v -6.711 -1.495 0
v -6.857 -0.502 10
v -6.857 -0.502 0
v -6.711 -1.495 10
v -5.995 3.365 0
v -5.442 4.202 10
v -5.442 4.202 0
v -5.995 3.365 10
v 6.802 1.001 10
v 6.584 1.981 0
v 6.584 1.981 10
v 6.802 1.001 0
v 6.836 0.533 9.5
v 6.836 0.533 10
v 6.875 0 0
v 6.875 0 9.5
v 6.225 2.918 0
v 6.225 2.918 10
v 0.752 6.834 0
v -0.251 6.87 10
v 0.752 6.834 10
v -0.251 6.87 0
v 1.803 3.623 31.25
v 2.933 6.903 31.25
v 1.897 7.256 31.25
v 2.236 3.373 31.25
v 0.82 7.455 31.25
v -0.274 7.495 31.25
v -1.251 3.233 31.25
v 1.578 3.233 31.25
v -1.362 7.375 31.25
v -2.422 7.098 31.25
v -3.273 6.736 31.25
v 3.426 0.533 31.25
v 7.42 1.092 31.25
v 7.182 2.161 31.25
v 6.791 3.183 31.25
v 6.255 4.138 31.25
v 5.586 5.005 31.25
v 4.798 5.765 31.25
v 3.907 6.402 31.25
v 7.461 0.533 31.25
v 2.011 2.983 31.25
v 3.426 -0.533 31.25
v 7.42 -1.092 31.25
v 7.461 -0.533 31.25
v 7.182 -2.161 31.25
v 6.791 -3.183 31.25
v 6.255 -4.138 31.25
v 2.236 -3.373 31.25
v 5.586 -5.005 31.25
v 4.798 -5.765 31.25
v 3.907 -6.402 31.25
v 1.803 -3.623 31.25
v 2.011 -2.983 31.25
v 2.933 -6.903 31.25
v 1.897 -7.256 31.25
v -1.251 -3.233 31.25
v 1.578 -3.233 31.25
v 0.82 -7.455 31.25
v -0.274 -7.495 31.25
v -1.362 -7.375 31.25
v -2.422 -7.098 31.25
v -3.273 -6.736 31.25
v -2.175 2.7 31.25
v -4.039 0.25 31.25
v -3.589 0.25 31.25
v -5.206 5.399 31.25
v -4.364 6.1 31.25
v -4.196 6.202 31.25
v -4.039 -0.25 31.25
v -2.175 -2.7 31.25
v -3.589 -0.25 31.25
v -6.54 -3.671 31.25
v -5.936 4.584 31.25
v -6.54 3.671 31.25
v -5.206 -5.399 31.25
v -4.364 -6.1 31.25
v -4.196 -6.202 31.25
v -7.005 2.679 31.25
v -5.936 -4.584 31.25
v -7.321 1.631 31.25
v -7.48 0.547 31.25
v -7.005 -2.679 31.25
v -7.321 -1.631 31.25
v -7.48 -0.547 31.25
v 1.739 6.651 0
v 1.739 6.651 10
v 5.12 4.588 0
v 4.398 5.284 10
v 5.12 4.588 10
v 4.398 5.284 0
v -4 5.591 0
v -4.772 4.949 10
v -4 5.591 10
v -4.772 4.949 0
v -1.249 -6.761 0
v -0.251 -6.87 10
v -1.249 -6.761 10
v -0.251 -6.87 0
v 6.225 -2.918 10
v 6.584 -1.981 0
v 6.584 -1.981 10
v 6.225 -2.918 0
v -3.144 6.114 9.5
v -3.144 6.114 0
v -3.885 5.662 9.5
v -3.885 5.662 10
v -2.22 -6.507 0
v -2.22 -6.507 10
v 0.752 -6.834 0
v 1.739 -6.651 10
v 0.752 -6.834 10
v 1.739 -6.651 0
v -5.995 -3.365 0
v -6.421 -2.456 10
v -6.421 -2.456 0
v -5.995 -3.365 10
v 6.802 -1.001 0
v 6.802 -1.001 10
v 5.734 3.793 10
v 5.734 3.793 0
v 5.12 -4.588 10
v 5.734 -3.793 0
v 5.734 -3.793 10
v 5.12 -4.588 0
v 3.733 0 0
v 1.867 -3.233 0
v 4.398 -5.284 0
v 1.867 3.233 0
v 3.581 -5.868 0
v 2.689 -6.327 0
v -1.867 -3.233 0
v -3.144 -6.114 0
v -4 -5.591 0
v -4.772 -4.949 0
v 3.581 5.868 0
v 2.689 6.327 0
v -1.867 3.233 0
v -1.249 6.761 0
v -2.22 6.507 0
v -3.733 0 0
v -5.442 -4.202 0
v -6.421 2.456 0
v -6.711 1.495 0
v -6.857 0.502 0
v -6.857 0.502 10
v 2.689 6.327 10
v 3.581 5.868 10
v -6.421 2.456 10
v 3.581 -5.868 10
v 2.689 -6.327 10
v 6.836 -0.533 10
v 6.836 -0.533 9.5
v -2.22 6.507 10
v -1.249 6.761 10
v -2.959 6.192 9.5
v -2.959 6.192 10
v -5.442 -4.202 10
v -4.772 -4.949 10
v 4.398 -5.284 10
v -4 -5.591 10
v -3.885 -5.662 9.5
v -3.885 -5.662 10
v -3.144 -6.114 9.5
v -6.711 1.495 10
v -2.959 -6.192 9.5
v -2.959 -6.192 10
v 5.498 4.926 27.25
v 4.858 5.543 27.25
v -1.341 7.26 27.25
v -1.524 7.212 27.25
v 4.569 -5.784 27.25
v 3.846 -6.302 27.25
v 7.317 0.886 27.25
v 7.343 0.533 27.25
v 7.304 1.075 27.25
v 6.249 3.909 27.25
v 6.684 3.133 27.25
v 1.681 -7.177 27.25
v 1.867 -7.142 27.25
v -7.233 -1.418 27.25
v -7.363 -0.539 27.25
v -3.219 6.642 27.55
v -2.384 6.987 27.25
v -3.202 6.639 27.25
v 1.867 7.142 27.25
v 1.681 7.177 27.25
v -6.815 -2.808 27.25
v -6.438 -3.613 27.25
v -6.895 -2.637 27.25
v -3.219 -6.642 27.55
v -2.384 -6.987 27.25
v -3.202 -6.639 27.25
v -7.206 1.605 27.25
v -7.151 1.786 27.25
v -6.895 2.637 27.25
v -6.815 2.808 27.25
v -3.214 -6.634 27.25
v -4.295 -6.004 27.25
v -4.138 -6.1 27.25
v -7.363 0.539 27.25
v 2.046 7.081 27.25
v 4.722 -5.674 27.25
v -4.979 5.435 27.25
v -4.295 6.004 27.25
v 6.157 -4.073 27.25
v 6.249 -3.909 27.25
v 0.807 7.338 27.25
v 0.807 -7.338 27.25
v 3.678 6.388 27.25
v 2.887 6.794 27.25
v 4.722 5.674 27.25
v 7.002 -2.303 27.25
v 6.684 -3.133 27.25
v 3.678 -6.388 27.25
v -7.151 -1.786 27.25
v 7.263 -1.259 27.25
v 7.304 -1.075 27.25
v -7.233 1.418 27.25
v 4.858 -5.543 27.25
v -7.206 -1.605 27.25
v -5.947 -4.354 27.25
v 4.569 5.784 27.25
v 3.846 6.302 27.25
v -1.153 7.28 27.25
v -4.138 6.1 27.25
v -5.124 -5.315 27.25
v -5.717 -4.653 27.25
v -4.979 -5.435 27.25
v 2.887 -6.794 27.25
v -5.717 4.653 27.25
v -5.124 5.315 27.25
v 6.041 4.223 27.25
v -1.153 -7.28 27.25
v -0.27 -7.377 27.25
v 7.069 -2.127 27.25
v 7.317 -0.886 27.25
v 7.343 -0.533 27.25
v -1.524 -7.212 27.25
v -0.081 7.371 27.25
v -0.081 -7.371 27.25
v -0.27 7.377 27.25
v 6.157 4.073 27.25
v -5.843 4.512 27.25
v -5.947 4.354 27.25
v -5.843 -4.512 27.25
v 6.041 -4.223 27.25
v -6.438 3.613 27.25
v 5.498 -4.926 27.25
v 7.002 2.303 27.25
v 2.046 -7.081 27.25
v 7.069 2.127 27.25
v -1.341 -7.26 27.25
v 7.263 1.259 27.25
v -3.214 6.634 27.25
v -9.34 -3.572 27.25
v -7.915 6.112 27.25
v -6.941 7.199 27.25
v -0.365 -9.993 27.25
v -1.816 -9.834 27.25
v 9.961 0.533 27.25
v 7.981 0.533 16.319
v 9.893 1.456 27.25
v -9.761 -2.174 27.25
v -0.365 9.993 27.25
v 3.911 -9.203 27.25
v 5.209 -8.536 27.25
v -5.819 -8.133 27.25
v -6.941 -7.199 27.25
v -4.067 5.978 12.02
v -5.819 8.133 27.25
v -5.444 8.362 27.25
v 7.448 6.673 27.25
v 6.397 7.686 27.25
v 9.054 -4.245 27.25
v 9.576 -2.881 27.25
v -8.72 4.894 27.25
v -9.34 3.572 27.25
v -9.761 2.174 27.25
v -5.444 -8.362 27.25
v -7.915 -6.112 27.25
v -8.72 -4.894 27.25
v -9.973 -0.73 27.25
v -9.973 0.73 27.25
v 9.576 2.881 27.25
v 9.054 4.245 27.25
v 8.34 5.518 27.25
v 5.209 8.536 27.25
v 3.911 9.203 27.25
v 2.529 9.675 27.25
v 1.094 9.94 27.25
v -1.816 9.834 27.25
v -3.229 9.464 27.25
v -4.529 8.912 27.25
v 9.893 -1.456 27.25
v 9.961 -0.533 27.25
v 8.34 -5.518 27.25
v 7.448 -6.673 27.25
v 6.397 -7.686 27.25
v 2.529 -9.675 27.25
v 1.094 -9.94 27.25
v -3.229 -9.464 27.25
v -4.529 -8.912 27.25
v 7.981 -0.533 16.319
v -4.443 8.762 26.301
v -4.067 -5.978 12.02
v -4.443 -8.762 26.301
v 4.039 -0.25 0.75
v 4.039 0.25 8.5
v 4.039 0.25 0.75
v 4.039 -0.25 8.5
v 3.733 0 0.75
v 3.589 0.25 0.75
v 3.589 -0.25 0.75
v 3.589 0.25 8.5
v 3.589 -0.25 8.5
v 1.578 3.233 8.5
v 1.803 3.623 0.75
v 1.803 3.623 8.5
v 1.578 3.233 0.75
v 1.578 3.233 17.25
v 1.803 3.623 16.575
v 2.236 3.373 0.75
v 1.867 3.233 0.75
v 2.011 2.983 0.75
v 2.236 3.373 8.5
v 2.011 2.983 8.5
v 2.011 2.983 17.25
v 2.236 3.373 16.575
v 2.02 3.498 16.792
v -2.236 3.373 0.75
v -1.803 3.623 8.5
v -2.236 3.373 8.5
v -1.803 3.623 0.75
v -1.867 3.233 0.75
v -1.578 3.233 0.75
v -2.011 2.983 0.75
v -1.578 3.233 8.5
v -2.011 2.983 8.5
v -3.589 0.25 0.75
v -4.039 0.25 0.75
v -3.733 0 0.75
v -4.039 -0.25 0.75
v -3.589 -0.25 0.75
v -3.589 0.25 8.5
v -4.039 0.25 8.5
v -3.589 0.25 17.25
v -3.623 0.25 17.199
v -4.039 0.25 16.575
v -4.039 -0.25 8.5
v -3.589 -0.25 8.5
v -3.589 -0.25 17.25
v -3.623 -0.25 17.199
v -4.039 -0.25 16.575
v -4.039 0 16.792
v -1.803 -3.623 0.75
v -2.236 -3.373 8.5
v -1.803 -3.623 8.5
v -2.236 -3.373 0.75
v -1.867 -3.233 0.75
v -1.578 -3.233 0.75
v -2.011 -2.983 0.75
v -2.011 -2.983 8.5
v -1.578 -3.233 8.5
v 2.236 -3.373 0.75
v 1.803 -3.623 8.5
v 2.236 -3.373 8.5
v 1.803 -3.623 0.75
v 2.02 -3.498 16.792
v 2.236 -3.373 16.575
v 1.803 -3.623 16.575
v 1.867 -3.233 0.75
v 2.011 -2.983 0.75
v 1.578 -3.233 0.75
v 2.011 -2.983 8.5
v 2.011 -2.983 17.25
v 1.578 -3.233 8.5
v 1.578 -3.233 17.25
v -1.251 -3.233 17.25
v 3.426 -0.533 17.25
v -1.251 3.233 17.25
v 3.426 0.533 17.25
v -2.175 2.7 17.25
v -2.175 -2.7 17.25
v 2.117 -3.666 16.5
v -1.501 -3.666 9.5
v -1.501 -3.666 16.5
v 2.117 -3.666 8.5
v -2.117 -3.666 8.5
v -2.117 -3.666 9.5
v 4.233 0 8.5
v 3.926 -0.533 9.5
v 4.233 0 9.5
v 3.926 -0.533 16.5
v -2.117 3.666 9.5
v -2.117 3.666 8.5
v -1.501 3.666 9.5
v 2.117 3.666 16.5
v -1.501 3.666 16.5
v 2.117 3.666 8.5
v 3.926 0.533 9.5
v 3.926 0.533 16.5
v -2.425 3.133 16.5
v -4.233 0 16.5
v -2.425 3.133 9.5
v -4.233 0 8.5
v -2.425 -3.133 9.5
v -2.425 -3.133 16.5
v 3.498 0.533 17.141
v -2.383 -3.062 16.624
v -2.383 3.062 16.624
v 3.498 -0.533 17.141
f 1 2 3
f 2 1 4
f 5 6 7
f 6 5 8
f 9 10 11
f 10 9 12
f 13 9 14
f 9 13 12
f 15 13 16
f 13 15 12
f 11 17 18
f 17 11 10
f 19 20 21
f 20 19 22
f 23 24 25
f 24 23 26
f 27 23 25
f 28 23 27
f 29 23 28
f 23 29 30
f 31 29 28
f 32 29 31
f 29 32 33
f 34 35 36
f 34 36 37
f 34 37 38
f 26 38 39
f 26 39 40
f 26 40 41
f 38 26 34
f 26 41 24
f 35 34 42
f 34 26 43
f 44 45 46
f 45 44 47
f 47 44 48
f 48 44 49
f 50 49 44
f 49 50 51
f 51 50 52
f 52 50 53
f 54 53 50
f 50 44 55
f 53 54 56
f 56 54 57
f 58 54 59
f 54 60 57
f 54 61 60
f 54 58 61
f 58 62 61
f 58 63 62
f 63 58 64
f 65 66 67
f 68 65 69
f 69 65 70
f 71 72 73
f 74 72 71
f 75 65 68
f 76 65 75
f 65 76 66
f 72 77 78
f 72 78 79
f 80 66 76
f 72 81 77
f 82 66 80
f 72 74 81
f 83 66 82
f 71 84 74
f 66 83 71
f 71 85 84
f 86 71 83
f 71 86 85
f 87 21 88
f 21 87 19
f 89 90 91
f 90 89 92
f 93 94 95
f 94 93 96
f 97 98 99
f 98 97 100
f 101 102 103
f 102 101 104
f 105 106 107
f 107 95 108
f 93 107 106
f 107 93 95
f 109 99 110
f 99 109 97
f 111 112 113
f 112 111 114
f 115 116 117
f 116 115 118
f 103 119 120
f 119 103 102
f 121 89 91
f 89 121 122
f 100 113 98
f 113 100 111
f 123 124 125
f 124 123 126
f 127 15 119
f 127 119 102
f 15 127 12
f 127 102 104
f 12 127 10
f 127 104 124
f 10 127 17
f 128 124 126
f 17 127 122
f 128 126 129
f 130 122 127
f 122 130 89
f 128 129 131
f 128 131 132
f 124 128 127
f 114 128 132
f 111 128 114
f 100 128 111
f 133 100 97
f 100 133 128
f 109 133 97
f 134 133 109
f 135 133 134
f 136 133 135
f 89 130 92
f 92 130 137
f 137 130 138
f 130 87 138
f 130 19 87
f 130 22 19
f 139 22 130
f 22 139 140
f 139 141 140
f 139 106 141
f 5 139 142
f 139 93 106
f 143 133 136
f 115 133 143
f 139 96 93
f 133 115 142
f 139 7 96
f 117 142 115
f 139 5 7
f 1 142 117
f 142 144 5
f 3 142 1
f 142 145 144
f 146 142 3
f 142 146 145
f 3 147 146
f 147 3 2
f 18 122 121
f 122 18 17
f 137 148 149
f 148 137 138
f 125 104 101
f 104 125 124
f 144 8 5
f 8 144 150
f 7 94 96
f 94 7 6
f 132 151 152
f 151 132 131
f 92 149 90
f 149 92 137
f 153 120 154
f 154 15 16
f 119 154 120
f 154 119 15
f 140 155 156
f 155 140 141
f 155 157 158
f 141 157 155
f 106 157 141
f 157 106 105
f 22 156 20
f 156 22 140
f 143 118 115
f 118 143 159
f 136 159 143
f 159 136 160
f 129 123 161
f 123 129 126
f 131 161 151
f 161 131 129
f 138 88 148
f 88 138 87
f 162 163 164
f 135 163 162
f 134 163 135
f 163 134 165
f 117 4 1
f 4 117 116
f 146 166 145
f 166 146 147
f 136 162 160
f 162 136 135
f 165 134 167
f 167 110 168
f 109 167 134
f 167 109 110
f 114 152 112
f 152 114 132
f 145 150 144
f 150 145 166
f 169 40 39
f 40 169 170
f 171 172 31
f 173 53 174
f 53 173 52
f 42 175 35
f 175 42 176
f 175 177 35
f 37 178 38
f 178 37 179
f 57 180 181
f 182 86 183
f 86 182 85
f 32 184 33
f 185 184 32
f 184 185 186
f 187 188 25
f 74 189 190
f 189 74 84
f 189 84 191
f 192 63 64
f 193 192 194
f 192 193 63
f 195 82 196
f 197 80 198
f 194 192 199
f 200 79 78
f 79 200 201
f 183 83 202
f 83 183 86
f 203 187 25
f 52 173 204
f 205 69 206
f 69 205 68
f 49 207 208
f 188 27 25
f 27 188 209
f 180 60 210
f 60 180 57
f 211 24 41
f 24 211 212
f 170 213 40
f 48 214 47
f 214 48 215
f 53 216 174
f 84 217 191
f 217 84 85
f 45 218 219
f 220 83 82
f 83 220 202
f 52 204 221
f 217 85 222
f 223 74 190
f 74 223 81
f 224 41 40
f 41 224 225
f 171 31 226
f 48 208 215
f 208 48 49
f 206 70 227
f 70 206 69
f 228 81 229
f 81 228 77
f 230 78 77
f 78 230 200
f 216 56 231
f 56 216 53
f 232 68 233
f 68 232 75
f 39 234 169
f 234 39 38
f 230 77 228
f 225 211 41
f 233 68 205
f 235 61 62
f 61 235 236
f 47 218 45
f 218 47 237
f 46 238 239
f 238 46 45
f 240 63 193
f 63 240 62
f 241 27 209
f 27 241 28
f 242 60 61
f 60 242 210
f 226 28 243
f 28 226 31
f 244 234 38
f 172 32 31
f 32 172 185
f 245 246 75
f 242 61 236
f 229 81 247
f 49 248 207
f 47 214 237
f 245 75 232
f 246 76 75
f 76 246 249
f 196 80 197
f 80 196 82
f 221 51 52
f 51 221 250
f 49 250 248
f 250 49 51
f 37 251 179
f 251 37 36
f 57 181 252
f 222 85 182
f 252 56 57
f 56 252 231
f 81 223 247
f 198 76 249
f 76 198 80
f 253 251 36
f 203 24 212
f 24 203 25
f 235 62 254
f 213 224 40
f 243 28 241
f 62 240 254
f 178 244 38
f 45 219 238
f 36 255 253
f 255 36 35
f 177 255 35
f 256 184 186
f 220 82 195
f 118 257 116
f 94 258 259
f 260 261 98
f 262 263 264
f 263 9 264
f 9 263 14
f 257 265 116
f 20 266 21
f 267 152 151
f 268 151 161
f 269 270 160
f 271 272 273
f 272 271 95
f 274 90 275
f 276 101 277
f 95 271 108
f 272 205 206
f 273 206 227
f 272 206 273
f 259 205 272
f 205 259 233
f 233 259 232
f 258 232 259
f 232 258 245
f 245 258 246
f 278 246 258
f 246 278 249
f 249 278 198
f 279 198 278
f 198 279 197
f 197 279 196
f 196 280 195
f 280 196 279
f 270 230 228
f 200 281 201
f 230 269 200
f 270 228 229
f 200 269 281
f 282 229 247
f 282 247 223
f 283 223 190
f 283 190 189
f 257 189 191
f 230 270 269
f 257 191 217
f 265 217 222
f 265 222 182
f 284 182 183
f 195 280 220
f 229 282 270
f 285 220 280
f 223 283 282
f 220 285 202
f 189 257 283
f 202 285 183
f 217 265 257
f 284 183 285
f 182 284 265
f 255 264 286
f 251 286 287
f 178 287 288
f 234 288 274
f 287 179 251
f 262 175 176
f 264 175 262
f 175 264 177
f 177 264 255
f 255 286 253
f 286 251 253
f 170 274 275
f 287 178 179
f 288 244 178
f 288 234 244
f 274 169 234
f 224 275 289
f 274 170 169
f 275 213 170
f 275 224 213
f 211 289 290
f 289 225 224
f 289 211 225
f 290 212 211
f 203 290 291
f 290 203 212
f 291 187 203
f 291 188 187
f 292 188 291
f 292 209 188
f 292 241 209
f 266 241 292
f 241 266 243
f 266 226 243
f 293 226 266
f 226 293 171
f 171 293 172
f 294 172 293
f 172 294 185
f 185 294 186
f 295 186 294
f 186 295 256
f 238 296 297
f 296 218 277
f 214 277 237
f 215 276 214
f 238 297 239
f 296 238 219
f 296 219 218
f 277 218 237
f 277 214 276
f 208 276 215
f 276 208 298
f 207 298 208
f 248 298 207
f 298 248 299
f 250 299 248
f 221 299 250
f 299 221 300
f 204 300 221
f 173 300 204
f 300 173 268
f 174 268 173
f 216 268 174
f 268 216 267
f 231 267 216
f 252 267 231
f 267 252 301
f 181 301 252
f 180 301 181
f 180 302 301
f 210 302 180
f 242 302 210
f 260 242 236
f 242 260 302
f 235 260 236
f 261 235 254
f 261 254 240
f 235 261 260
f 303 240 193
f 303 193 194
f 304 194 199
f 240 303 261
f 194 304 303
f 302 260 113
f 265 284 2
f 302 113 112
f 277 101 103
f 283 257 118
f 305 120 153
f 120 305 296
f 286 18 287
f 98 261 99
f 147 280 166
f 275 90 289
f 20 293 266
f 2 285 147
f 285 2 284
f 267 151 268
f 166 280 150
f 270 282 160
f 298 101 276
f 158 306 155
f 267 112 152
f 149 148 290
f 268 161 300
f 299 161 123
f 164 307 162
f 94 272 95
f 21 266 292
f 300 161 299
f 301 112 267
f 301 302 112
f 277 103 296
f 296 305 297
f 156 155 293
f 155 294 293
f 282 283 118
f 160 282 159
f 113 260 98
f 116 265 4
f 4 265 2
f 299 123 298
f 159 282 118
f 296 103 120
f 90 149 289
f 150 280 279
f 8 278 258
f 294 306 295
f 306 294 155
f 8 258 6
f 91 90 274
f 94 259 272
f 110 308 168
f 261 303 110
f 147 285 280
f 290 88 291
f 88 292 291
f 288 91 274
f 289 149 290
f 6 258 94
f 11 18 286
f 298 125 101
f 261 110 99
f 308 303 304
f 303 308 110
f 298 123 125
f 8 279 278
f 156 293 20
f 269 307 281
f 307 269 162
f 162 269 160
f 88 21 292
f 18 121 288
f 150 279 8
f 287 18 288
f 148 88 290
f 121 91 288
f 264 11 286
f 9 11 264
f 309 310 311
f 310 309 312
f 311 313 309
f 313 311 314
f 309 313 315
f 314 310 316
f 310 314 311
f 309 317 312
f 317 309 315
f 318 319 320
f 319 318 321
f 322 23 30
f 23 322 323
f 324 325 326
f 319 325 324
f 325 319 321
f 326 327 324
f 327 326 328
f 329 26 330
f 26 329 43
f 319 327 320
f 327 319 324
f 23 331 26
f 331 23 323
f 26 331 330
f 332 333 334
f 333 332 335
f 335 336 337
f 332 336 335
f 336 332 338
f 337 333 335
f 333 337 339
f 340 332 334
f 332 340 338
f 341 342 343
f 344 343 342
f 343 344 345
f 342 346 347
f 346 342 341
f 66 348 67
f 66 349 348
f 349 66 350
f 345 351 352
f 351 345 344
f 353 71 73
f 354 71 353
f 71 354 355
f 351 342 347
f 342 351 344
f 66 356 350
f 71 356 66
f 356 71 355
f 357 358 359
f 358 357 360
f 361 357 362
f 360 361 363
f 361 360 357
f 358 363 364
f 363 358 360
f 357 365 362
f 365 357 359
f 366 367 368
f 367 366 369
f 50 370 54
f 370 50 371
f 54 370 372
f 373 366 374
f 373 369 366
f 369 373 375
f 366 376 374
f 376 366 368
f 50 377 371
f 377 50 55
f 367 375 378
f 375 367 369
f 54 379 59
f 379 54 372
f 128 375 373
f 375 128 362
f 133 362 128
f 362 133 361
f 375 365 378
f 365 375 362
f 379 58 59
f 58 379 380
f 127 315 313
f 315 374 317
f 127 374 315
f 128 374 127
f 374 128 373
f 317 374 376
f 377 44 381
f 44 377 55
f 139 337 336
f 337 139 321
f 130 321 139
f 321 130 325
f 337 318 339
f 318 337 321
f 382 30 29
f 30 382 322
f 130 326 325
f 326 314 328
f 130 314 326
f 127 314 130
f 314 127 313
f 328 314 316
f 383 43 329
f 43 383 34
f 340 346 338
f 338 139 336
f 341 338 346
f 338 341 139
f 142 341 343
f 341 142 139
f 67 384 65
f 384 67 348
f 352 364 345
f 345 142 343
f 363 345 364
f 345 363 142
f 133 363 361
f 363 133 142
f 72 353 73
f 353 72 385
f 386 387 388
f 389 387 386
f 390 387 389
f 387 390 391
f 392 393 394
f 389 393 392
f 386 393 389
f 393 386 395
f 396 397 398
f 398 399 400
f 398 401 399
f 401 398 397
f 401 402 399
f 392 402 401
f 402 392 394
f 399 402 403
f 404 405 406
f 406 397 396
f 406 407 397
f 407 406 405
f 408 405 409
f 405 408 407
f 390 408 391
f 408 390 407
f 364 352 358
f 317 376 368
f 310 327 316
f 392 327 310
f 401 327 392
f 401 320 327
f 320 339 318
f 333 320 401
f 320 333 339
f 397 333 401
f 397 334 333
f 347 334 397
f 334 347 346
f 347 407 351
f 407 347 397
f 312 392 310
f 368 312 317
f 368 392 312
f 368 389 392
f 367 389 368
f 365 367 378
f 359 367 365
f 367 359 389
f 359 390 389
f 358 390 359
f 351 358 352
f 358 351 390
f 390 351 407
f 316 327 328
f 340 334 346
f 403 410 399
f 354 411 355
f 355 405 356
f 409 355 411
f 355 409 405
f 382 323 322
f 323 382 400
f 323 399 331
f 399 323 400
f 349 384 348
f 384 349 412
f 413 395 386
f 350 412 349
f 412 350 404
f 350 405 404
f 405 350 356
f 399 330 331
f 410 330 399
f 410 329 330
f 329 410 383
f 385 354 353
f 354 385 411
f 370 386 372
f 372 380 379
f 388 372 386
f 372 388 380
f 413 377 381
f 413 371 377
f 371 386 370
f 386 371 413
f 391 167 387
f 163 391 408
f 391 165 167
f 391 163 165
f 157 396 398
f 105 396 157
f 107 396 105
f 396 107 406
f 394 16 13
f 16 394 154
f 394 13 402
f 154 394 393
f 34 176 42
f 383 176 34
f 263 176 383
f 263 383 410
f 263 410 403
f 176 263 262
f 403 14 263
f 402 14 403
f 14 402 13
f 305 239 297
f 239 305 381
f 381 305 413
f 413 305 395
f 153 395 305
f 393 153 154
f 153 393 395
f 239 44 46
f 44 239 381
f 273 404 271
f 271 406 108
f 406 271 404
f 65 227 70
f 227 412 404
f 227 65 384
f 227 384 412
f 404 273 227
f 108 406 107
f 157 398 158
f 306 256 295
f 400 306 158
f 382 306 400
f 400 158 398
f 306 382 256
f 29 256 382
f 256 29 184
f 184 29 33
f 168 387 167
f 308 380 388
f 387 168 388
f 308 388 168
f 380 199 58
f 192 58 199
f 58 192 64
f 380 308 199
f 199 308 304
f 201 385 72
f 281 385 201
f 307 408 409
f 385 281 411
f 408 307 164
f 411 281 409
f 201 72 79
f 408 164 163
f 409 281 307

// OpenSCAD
// [FL_INDEX: keywords="openscad, 3d_parametric, Collets_for_Tap_Holder, csg_solid" | COT="Parametric OpenSCAD design from 3DCodeverse"]
// Title: Collets for Tap Holder

/*
 * collets4tapHolder.scad
 * 
 * Written by aubenc @ Thingiverse
 *
 * http://www.thingiverse.com/thing:16956
 *
 * This script is licensed under the
 * Attribution - Share Alike license
 *
 * This is a derivative work of "Tap holder" by Rasle500
 *
 *		http://www.thingiverse.com/thing:16682
 *
 * ...and the derivatives of that work:
 *
 *		http://www.thingiverse.com/thing:16839
 *		http://www.thingiverse.com/thing:16890
 *
 * Usage:
 *
 *    Set the parameters for the desired output, run the required module(s),
 *		render to check, compile and export to STL when/if satisfied.
 *
 */


/* *************** Parameters *********************************************** */

typ="H";		// "C" - Cylindrical, Drill Bit / "H" - Hex, Accessoire


// Parameters for type "C"

dbd=3.2;		// Drill Bit Diameter


// Parameters for type "H"

f2f=6.25;	// Distance between opposite faces
ffn=6;		// Faces number, should NOT work for any value but 6 (hex)
fop="V";		// opening at... "V" - Vertex / "F" - Face
fvs=0.5;		// Side length of the cube used to exagerate the cut for the vertex


// Common Parameters

gap=0.25;	// ...gap ...tolerance ... ... ...
ono=3;		// Number of openings, cuts, clamps, whatever
omn=0.5;		// Minimum size to keep it open (avoid the walls fusing together)


/* *************** Modules ************************************************** */

 collet(typ); 


/* *************** Code ***************************************************** */

module collet(typ)
{
	difference()
	{
		body();

		if( typ == "C" )
		{
			drill_bit();
			openings();
		}
		else if( typ == "H" )
		{
			union()
			{
				accessoire_bit();

				if( fop == "V" )
				{
					openings();
				}
				else if ( fop == "F" )
				{
					rotate([0,0,360/ffn/2]) openings();
				}
			}
		}
	}
}

module body()
{
	union()
	{
		cylinder(h=31.25, r=13.75/2, $fn=13.75*PI, center=false);

		translate([0,0,10])
		cylinder(h=31.25-10, r1=13.75/2, r2=15/2, $fn=13.75*PI, center=false);

		translate([0,0,10])
		cylinder(h=31.25-10-4, r1=13.75/2, r2=20/2, $fn=13.75*PI, center=false);
	}
}

module drill_bit()
{
   cfn=ono*round(dbd*PI/ono);

	union()
	{
		translate([0,0,-0.1])
		cylinder(h=10+0.2, r=(dbd-gap)/2, $fn=cfn, center=false);

		translate([0,0,7])
		cylinder(h=31.25-7+0.2, r=(dbd+gap)/2, $fn=cfn, center=false);

		translate([0,0,8.5])
		cylinder(h=8, r=(dbd+gap+1)/2, $fn=cfn, center=false);

		translate([0,0,8.5+8])
		cylinder(h=0.75, r1=(dbd+gap+1)/2, r2=(dbd+gap)/2, $fn=cfn, center=false);
	}
}

module openings()
{

	oy=dbd/ono > omn ? dbd/ono : omn;

	translate([0,0,9.5])
	for(i=[0:ono-1])
	{
		rotate([0,0,i*360/ono])
		translate([6,0,31.25/2])
		cube(size=[12,oy,31.25], center=true);
	}
}

module accessoire_bit()
{
	lf=360/ffn;
	fod=f2f/sin(lf);

	union()
	{
		translate([0,0,-0.1])
		cylinder(h=31.25+0.2, r=(fod+gap)/2, $fn=ffn, center=false);

		translate([0,0,8.5])
		cylinder(h=8, r=(fod+gap+1)/2, $fn=ffn, center=false);

		translate([0,0,8.5+8])
		cylinder(h=0.75, r1=(fod+gap+1)/2, r2=(fod+gap)/2, $fn=ffn, center=false);

		if( fvs != 0 )
		assign(xd=(fod+gap+fvs)/2-(fvs*cos(lf)/2/sin(lf))-0.05)
		{
			for(i=[0:ffn-1])
			assign(x=xd*cos(i*lf), y=xd*sin(i*lf))
			{
				translate([x,y,31.25/2+0.75])
				rotate([0,0,i*lf])
				cube([fvs,fvs,31.25], center=true);
			}
		}
	}
}
